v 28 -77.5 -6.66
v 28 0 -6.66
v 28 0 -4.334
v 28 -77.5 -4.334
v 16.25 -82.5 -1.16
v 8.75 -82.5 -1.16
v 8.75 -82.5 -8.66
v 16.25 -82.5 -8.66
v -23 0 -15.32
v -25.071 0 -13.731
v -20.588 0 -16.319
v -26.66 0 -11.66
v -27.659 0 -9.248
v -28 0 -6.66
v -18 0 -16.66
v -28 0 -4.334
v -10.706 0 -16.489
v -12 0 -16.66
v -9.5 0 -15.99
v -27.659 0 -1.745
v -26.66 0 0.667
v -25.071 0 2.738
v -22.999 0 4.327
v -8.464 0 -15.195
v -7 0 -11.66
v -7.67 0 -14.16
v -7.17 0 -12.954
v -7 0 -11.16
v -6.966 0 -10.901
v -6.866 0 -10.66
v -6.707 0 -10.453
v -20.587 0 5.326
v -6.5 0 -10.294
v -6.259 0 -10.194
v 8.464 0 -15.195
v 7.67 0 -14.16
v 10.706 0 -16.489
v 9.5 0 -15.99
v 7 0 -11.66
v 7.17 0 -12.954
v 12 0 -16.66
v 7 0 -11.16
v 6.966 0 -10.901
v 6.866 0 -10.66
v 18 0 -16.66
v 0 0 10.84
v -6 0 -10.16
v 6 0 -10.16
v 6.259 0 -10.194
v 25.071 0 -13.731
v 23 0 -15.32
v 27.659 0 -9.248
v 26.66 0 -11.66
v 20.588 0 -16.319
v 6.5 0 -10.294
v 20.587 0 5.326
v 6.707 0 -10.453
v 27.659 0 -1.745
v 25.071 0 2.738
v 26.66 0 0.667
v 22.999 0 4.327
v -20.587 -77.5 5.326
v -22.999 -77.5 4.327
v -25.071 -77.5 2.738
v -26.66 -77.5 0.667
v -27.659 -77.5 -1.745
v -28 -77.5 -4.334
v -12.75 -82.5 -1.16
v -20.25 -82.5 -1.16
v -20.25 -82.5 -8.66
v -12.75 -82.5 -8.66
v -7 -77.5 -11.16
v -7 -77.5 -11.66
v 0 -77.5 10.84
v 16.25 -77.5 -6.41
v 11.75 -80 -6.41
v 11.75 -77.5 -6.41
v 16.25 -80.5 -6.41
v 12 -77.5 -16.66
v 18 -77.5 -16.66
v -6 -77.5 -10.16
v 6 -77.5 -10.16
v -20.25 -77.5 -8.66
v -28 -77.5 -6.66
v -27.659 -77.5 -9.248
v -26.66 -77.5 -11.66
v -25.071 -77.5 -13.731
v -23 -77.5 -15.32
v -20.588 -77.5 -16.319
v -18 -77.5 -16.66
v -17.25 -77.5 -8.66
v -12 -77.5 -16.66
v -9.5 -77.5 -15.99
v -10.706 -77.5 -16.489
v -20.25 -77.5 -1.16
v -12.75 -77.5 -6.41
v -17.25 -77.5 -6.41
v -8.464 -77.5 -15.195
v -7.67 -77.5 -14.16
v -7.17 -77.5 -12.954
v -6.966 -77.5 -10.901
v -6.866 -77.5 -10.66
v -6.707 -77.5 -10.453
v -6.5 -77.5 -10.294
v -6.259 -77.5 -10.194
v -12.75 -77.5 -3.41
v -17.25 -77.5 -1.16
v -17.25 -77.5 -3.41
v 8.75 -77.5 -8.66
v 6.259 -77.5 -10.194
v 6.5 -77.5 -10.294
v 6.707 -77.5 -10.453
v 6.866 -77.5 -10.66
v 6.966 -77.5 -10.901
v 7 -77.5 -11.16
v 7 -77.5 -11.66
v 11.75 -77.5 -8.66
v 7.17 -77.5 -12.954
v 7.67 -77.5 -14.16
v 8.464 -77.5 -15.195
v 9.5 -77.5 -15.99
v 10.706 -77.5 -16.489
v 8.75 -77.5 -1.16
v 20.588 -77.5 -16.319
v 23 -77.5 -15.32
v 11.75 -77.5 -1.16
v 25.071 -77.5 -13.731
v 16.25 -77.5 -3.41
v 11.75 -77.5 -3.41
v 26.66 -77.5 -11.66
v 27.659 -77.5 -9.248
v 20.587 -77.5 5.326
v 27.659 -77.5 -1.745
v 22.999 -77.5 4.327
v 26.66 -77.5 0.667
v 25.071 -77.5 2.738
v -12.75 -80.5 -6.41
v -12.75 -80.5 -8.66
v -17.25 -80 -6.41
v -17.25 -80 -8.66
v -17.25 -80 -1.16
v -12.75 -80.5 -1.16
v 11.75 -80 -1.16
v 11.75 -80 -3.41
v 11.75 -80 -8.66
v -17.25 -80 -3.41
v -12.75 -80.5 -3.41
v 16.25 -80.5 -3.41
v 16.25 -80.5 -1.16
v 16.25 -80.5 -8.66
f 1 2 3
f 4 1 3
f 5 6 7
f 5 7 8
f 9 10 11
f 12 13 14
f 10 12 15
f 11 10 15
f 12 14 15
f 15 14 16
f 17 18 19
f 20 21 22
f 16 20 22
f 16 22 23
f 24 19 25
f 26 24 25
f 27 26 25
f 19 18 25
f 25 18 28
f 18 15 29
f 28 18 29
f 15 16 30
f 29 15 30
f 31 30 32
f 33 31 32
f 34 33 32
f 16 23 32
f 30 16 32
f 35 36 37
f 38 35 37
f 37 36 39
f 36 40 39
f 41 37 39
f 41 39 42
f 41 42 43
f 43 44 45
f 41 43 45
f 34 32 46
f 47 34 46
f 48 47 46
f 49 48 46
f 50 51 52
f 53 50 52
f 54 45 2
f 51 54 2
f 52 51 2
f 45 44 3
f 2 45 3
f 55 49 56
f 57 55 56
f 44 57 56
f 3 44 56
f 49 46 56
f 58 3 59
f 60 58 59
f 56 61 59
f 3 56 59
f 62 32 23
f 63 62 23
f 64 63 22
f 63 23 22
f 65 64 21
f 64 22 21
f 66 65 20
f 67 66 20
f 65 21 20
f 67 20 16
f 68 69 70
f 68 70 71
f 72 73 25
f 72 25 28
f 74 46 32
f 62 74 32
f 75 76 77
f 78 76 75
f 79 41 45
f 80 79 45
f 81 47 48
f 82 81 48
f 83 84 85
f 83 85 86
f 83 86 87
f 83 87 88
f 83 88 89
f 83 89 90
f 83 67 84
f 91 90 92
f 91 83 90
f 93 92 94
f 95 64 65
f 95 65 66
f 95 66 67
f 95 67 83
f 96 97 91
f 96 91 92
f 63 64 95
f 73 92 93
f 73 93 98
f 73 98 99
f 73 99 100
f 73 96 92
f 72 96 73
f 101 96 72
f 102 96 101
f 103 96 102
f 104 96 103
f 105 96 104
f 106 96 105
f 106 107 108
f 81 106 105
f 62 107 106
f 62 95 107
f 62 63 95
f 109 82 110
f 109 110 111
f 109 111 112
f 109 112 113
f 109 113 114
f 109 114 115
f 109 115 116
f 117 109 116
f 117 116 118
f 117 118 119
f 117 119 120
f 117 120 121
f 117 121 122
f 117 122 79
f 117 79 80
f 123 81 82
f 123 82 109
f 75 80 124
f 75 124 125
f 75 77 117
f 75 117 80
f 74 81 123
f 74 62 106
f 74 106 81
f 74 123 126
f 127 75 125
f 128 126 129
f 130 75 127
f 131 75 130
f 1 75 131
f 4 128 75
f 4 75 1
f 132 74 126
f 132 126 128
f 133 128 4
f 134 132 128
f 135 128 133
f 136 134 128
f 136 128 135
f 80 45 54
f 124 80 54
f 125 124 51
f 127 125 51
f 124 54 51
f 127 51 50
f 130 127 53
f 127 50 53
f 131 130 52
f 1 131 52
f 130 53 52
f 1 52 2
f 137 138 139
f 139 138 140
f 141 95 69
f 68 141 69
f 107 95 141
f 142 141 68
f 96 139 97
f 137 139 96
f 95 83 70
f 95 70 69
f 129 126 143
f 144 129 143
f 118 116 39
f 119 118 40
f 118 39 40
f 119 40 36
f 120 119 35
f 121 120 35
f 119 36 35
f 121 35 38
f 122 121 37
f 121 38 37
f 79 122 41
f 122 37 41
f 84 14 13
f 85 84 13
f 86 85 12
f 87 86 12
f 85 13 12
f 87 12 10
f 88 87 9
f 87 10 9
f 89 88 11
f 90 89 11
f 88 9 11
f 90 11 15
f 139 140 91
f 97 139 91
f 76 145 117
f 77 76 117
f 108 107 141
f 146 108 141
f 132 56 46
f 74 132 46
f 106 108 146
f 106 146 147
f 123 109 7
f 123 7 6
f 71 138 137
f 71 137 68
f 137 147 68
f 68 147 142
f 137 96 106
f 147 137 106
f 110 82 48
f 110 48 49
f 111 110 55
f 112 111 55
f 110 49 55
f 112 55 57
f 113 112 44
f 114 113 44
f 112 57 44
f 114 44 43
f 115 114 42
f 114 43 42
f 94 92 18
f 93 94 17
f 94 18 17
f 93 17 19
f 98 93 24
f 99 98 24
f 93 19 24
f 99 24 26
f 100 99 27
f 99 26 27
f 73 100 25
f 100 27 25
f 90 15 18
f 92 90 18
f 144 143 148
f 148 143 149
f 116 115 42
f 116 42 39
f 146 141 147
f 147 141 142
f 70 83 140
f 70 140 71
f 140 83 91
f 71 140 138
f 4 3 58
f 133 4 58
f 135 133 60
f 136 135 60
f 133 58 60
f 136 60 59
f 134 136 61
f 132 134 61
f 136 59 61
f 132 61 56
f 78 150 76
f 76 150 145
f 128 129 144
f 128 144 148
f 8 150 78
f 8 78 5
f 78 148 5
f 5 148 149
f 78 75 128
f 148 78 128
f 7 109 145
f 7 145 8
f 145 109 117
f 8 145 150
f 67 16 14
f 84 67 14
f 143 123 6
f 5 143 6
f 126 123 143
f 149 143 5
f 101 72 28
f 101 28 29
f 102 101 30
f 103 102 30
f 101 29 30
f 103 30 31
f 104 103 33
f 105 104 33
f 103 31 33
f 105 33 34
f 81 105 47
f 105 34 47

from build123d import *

# Parameters (mm, degrees)
F1_DEPTH  = 77.5
F2_W      = 7.5
F2_H      = 7.5
F3_DEPTH  = 5
F6_DEPTH  = 2.25
F7_DEPTH  = 2.25
F10_DEPTH = 2.25
F11_DEPTH = 2.25


with BuildPart() as f1:
    # F0 (on Front) → F1 (new body)
    with BuildSketch(Plane.XZ):
        with BuildLine():
            ThreePointArc((-28, -6.6598297656), (-25.0710678119, -13.7308975774), (-18, -16.6598297656))
            Line((-18, -16.6598297656), (-12, -16.6598297656))
            ThreePointArc((-12, -16.6598297656), (-8.4644660941, -15.1953636715), (-7, -11.6598297656))
            Line((-7, -11.6598297656), (-7, -11.1598297656))
            ThreePointArc((-7, -11.1598297656), (-6.7071067812, -10.4527229844), (-6, -10.1598297656))
            Line((-6, -10.1598297656), (6, -10.1598297656))
            ThreePointArc((6, -10.1598297656), (6.7071067812, -10.4527229844), (7, -11.1598297656))
            Line((7, -11.1598297656), (7, -11.6598297656))
            ThreePointArc((7, -11.6598297656), (8.4644660941, -15.1953636715), (12, -16.6598297656))
            Line((12, -16.6598297656), (18, -16.6598297656))
            ThreePointArc((18, -16.6598297656), (25.0710678119, -13.7308975774), (28, -6.6598297656))
            Line((28, -6.6598297656), (28, -4.3337819374))
            ThreePointArc((28, -4.3337819374), (25.933271977, 1.7541730344), (20.5873608522, 5.3256985776))
            Line((20.5873608522, 5.3256985776), (0, 10.8401702344))
            Line((0, 10.8401702344), (-20.5873608522, 5.3256985776))
            ThreePointArc((-20.5873608522, 5.3256985776), (-25.933271977, 1.7541730344), (-28, -4.3337819374))
            Line((-28, -4.3337819374), (-28, -6.6598297656))
        make_face()
    extrude(amount=F1_DEPTH)

    # F2 (on face) → F3 (join)
    with BuildSketch(Plane.XZ.offset(77.5)):
        with Locations((-16.5, -4.9098297656)):
            Rectangle(F2_W, F2_H)
        with Locations((12.5, -4.9098297656)):
            Rectangle(F2_W, F2_H)
    extrude(amount=F3_DEPTH)

    # F4 (on face) → F6 (cut)
    with BuildSketch(Plane.XY.offset(-1.1598297656)):
        Polygon((-12.75, -77.5), (-17.25, -77.5), (-17.25, -80), (-12.75, -80.5), align=None)
    extrude(amount=-F6_DEPTH, mode=Mode.SUBTRACT)

    # F5 (on face) → F7 (cut)
    with BuildSketch(Plane.XY.offset(-1.1598297656)):
        Polygon((16.25, -77.5), (11.75, -77.5), (11.75, -80), (16.25, -80.5), align=None)
    extrude(amount=-F7_DEPTH, mode=Mode.SUBTRACT)

    # F8 (on face) → F10 (cut)
    with BuildSketch(Plane(origin=(0, 0, -8.6598297656), x_dir=(1, 0, 0), z_dir=(0, 0, -1))):
        Polygon((11.75, 80), (11.75, 77.5), (16.25, 77.5), (16.25, 80.5), align=None)
    extrude(amount=-F10_DEPTH, mode=Mode.SUBTRACT)

    # F9 (on face) → F11 (cut)
    with BuildSketch(Plane(origin=(0, 0, -8.6598297656), x_dir=(1, 0, 0), z_dir=(0, 0, -1))):
        Polygon((-17.25, 80), (-17.25, 77.5), (-12.75, 77.5), (-12.75, 80.5), align=None)
    extrude(amount=-F11_DEPTH, mode=Mode.SUBTRACT)


solid = f1.part
